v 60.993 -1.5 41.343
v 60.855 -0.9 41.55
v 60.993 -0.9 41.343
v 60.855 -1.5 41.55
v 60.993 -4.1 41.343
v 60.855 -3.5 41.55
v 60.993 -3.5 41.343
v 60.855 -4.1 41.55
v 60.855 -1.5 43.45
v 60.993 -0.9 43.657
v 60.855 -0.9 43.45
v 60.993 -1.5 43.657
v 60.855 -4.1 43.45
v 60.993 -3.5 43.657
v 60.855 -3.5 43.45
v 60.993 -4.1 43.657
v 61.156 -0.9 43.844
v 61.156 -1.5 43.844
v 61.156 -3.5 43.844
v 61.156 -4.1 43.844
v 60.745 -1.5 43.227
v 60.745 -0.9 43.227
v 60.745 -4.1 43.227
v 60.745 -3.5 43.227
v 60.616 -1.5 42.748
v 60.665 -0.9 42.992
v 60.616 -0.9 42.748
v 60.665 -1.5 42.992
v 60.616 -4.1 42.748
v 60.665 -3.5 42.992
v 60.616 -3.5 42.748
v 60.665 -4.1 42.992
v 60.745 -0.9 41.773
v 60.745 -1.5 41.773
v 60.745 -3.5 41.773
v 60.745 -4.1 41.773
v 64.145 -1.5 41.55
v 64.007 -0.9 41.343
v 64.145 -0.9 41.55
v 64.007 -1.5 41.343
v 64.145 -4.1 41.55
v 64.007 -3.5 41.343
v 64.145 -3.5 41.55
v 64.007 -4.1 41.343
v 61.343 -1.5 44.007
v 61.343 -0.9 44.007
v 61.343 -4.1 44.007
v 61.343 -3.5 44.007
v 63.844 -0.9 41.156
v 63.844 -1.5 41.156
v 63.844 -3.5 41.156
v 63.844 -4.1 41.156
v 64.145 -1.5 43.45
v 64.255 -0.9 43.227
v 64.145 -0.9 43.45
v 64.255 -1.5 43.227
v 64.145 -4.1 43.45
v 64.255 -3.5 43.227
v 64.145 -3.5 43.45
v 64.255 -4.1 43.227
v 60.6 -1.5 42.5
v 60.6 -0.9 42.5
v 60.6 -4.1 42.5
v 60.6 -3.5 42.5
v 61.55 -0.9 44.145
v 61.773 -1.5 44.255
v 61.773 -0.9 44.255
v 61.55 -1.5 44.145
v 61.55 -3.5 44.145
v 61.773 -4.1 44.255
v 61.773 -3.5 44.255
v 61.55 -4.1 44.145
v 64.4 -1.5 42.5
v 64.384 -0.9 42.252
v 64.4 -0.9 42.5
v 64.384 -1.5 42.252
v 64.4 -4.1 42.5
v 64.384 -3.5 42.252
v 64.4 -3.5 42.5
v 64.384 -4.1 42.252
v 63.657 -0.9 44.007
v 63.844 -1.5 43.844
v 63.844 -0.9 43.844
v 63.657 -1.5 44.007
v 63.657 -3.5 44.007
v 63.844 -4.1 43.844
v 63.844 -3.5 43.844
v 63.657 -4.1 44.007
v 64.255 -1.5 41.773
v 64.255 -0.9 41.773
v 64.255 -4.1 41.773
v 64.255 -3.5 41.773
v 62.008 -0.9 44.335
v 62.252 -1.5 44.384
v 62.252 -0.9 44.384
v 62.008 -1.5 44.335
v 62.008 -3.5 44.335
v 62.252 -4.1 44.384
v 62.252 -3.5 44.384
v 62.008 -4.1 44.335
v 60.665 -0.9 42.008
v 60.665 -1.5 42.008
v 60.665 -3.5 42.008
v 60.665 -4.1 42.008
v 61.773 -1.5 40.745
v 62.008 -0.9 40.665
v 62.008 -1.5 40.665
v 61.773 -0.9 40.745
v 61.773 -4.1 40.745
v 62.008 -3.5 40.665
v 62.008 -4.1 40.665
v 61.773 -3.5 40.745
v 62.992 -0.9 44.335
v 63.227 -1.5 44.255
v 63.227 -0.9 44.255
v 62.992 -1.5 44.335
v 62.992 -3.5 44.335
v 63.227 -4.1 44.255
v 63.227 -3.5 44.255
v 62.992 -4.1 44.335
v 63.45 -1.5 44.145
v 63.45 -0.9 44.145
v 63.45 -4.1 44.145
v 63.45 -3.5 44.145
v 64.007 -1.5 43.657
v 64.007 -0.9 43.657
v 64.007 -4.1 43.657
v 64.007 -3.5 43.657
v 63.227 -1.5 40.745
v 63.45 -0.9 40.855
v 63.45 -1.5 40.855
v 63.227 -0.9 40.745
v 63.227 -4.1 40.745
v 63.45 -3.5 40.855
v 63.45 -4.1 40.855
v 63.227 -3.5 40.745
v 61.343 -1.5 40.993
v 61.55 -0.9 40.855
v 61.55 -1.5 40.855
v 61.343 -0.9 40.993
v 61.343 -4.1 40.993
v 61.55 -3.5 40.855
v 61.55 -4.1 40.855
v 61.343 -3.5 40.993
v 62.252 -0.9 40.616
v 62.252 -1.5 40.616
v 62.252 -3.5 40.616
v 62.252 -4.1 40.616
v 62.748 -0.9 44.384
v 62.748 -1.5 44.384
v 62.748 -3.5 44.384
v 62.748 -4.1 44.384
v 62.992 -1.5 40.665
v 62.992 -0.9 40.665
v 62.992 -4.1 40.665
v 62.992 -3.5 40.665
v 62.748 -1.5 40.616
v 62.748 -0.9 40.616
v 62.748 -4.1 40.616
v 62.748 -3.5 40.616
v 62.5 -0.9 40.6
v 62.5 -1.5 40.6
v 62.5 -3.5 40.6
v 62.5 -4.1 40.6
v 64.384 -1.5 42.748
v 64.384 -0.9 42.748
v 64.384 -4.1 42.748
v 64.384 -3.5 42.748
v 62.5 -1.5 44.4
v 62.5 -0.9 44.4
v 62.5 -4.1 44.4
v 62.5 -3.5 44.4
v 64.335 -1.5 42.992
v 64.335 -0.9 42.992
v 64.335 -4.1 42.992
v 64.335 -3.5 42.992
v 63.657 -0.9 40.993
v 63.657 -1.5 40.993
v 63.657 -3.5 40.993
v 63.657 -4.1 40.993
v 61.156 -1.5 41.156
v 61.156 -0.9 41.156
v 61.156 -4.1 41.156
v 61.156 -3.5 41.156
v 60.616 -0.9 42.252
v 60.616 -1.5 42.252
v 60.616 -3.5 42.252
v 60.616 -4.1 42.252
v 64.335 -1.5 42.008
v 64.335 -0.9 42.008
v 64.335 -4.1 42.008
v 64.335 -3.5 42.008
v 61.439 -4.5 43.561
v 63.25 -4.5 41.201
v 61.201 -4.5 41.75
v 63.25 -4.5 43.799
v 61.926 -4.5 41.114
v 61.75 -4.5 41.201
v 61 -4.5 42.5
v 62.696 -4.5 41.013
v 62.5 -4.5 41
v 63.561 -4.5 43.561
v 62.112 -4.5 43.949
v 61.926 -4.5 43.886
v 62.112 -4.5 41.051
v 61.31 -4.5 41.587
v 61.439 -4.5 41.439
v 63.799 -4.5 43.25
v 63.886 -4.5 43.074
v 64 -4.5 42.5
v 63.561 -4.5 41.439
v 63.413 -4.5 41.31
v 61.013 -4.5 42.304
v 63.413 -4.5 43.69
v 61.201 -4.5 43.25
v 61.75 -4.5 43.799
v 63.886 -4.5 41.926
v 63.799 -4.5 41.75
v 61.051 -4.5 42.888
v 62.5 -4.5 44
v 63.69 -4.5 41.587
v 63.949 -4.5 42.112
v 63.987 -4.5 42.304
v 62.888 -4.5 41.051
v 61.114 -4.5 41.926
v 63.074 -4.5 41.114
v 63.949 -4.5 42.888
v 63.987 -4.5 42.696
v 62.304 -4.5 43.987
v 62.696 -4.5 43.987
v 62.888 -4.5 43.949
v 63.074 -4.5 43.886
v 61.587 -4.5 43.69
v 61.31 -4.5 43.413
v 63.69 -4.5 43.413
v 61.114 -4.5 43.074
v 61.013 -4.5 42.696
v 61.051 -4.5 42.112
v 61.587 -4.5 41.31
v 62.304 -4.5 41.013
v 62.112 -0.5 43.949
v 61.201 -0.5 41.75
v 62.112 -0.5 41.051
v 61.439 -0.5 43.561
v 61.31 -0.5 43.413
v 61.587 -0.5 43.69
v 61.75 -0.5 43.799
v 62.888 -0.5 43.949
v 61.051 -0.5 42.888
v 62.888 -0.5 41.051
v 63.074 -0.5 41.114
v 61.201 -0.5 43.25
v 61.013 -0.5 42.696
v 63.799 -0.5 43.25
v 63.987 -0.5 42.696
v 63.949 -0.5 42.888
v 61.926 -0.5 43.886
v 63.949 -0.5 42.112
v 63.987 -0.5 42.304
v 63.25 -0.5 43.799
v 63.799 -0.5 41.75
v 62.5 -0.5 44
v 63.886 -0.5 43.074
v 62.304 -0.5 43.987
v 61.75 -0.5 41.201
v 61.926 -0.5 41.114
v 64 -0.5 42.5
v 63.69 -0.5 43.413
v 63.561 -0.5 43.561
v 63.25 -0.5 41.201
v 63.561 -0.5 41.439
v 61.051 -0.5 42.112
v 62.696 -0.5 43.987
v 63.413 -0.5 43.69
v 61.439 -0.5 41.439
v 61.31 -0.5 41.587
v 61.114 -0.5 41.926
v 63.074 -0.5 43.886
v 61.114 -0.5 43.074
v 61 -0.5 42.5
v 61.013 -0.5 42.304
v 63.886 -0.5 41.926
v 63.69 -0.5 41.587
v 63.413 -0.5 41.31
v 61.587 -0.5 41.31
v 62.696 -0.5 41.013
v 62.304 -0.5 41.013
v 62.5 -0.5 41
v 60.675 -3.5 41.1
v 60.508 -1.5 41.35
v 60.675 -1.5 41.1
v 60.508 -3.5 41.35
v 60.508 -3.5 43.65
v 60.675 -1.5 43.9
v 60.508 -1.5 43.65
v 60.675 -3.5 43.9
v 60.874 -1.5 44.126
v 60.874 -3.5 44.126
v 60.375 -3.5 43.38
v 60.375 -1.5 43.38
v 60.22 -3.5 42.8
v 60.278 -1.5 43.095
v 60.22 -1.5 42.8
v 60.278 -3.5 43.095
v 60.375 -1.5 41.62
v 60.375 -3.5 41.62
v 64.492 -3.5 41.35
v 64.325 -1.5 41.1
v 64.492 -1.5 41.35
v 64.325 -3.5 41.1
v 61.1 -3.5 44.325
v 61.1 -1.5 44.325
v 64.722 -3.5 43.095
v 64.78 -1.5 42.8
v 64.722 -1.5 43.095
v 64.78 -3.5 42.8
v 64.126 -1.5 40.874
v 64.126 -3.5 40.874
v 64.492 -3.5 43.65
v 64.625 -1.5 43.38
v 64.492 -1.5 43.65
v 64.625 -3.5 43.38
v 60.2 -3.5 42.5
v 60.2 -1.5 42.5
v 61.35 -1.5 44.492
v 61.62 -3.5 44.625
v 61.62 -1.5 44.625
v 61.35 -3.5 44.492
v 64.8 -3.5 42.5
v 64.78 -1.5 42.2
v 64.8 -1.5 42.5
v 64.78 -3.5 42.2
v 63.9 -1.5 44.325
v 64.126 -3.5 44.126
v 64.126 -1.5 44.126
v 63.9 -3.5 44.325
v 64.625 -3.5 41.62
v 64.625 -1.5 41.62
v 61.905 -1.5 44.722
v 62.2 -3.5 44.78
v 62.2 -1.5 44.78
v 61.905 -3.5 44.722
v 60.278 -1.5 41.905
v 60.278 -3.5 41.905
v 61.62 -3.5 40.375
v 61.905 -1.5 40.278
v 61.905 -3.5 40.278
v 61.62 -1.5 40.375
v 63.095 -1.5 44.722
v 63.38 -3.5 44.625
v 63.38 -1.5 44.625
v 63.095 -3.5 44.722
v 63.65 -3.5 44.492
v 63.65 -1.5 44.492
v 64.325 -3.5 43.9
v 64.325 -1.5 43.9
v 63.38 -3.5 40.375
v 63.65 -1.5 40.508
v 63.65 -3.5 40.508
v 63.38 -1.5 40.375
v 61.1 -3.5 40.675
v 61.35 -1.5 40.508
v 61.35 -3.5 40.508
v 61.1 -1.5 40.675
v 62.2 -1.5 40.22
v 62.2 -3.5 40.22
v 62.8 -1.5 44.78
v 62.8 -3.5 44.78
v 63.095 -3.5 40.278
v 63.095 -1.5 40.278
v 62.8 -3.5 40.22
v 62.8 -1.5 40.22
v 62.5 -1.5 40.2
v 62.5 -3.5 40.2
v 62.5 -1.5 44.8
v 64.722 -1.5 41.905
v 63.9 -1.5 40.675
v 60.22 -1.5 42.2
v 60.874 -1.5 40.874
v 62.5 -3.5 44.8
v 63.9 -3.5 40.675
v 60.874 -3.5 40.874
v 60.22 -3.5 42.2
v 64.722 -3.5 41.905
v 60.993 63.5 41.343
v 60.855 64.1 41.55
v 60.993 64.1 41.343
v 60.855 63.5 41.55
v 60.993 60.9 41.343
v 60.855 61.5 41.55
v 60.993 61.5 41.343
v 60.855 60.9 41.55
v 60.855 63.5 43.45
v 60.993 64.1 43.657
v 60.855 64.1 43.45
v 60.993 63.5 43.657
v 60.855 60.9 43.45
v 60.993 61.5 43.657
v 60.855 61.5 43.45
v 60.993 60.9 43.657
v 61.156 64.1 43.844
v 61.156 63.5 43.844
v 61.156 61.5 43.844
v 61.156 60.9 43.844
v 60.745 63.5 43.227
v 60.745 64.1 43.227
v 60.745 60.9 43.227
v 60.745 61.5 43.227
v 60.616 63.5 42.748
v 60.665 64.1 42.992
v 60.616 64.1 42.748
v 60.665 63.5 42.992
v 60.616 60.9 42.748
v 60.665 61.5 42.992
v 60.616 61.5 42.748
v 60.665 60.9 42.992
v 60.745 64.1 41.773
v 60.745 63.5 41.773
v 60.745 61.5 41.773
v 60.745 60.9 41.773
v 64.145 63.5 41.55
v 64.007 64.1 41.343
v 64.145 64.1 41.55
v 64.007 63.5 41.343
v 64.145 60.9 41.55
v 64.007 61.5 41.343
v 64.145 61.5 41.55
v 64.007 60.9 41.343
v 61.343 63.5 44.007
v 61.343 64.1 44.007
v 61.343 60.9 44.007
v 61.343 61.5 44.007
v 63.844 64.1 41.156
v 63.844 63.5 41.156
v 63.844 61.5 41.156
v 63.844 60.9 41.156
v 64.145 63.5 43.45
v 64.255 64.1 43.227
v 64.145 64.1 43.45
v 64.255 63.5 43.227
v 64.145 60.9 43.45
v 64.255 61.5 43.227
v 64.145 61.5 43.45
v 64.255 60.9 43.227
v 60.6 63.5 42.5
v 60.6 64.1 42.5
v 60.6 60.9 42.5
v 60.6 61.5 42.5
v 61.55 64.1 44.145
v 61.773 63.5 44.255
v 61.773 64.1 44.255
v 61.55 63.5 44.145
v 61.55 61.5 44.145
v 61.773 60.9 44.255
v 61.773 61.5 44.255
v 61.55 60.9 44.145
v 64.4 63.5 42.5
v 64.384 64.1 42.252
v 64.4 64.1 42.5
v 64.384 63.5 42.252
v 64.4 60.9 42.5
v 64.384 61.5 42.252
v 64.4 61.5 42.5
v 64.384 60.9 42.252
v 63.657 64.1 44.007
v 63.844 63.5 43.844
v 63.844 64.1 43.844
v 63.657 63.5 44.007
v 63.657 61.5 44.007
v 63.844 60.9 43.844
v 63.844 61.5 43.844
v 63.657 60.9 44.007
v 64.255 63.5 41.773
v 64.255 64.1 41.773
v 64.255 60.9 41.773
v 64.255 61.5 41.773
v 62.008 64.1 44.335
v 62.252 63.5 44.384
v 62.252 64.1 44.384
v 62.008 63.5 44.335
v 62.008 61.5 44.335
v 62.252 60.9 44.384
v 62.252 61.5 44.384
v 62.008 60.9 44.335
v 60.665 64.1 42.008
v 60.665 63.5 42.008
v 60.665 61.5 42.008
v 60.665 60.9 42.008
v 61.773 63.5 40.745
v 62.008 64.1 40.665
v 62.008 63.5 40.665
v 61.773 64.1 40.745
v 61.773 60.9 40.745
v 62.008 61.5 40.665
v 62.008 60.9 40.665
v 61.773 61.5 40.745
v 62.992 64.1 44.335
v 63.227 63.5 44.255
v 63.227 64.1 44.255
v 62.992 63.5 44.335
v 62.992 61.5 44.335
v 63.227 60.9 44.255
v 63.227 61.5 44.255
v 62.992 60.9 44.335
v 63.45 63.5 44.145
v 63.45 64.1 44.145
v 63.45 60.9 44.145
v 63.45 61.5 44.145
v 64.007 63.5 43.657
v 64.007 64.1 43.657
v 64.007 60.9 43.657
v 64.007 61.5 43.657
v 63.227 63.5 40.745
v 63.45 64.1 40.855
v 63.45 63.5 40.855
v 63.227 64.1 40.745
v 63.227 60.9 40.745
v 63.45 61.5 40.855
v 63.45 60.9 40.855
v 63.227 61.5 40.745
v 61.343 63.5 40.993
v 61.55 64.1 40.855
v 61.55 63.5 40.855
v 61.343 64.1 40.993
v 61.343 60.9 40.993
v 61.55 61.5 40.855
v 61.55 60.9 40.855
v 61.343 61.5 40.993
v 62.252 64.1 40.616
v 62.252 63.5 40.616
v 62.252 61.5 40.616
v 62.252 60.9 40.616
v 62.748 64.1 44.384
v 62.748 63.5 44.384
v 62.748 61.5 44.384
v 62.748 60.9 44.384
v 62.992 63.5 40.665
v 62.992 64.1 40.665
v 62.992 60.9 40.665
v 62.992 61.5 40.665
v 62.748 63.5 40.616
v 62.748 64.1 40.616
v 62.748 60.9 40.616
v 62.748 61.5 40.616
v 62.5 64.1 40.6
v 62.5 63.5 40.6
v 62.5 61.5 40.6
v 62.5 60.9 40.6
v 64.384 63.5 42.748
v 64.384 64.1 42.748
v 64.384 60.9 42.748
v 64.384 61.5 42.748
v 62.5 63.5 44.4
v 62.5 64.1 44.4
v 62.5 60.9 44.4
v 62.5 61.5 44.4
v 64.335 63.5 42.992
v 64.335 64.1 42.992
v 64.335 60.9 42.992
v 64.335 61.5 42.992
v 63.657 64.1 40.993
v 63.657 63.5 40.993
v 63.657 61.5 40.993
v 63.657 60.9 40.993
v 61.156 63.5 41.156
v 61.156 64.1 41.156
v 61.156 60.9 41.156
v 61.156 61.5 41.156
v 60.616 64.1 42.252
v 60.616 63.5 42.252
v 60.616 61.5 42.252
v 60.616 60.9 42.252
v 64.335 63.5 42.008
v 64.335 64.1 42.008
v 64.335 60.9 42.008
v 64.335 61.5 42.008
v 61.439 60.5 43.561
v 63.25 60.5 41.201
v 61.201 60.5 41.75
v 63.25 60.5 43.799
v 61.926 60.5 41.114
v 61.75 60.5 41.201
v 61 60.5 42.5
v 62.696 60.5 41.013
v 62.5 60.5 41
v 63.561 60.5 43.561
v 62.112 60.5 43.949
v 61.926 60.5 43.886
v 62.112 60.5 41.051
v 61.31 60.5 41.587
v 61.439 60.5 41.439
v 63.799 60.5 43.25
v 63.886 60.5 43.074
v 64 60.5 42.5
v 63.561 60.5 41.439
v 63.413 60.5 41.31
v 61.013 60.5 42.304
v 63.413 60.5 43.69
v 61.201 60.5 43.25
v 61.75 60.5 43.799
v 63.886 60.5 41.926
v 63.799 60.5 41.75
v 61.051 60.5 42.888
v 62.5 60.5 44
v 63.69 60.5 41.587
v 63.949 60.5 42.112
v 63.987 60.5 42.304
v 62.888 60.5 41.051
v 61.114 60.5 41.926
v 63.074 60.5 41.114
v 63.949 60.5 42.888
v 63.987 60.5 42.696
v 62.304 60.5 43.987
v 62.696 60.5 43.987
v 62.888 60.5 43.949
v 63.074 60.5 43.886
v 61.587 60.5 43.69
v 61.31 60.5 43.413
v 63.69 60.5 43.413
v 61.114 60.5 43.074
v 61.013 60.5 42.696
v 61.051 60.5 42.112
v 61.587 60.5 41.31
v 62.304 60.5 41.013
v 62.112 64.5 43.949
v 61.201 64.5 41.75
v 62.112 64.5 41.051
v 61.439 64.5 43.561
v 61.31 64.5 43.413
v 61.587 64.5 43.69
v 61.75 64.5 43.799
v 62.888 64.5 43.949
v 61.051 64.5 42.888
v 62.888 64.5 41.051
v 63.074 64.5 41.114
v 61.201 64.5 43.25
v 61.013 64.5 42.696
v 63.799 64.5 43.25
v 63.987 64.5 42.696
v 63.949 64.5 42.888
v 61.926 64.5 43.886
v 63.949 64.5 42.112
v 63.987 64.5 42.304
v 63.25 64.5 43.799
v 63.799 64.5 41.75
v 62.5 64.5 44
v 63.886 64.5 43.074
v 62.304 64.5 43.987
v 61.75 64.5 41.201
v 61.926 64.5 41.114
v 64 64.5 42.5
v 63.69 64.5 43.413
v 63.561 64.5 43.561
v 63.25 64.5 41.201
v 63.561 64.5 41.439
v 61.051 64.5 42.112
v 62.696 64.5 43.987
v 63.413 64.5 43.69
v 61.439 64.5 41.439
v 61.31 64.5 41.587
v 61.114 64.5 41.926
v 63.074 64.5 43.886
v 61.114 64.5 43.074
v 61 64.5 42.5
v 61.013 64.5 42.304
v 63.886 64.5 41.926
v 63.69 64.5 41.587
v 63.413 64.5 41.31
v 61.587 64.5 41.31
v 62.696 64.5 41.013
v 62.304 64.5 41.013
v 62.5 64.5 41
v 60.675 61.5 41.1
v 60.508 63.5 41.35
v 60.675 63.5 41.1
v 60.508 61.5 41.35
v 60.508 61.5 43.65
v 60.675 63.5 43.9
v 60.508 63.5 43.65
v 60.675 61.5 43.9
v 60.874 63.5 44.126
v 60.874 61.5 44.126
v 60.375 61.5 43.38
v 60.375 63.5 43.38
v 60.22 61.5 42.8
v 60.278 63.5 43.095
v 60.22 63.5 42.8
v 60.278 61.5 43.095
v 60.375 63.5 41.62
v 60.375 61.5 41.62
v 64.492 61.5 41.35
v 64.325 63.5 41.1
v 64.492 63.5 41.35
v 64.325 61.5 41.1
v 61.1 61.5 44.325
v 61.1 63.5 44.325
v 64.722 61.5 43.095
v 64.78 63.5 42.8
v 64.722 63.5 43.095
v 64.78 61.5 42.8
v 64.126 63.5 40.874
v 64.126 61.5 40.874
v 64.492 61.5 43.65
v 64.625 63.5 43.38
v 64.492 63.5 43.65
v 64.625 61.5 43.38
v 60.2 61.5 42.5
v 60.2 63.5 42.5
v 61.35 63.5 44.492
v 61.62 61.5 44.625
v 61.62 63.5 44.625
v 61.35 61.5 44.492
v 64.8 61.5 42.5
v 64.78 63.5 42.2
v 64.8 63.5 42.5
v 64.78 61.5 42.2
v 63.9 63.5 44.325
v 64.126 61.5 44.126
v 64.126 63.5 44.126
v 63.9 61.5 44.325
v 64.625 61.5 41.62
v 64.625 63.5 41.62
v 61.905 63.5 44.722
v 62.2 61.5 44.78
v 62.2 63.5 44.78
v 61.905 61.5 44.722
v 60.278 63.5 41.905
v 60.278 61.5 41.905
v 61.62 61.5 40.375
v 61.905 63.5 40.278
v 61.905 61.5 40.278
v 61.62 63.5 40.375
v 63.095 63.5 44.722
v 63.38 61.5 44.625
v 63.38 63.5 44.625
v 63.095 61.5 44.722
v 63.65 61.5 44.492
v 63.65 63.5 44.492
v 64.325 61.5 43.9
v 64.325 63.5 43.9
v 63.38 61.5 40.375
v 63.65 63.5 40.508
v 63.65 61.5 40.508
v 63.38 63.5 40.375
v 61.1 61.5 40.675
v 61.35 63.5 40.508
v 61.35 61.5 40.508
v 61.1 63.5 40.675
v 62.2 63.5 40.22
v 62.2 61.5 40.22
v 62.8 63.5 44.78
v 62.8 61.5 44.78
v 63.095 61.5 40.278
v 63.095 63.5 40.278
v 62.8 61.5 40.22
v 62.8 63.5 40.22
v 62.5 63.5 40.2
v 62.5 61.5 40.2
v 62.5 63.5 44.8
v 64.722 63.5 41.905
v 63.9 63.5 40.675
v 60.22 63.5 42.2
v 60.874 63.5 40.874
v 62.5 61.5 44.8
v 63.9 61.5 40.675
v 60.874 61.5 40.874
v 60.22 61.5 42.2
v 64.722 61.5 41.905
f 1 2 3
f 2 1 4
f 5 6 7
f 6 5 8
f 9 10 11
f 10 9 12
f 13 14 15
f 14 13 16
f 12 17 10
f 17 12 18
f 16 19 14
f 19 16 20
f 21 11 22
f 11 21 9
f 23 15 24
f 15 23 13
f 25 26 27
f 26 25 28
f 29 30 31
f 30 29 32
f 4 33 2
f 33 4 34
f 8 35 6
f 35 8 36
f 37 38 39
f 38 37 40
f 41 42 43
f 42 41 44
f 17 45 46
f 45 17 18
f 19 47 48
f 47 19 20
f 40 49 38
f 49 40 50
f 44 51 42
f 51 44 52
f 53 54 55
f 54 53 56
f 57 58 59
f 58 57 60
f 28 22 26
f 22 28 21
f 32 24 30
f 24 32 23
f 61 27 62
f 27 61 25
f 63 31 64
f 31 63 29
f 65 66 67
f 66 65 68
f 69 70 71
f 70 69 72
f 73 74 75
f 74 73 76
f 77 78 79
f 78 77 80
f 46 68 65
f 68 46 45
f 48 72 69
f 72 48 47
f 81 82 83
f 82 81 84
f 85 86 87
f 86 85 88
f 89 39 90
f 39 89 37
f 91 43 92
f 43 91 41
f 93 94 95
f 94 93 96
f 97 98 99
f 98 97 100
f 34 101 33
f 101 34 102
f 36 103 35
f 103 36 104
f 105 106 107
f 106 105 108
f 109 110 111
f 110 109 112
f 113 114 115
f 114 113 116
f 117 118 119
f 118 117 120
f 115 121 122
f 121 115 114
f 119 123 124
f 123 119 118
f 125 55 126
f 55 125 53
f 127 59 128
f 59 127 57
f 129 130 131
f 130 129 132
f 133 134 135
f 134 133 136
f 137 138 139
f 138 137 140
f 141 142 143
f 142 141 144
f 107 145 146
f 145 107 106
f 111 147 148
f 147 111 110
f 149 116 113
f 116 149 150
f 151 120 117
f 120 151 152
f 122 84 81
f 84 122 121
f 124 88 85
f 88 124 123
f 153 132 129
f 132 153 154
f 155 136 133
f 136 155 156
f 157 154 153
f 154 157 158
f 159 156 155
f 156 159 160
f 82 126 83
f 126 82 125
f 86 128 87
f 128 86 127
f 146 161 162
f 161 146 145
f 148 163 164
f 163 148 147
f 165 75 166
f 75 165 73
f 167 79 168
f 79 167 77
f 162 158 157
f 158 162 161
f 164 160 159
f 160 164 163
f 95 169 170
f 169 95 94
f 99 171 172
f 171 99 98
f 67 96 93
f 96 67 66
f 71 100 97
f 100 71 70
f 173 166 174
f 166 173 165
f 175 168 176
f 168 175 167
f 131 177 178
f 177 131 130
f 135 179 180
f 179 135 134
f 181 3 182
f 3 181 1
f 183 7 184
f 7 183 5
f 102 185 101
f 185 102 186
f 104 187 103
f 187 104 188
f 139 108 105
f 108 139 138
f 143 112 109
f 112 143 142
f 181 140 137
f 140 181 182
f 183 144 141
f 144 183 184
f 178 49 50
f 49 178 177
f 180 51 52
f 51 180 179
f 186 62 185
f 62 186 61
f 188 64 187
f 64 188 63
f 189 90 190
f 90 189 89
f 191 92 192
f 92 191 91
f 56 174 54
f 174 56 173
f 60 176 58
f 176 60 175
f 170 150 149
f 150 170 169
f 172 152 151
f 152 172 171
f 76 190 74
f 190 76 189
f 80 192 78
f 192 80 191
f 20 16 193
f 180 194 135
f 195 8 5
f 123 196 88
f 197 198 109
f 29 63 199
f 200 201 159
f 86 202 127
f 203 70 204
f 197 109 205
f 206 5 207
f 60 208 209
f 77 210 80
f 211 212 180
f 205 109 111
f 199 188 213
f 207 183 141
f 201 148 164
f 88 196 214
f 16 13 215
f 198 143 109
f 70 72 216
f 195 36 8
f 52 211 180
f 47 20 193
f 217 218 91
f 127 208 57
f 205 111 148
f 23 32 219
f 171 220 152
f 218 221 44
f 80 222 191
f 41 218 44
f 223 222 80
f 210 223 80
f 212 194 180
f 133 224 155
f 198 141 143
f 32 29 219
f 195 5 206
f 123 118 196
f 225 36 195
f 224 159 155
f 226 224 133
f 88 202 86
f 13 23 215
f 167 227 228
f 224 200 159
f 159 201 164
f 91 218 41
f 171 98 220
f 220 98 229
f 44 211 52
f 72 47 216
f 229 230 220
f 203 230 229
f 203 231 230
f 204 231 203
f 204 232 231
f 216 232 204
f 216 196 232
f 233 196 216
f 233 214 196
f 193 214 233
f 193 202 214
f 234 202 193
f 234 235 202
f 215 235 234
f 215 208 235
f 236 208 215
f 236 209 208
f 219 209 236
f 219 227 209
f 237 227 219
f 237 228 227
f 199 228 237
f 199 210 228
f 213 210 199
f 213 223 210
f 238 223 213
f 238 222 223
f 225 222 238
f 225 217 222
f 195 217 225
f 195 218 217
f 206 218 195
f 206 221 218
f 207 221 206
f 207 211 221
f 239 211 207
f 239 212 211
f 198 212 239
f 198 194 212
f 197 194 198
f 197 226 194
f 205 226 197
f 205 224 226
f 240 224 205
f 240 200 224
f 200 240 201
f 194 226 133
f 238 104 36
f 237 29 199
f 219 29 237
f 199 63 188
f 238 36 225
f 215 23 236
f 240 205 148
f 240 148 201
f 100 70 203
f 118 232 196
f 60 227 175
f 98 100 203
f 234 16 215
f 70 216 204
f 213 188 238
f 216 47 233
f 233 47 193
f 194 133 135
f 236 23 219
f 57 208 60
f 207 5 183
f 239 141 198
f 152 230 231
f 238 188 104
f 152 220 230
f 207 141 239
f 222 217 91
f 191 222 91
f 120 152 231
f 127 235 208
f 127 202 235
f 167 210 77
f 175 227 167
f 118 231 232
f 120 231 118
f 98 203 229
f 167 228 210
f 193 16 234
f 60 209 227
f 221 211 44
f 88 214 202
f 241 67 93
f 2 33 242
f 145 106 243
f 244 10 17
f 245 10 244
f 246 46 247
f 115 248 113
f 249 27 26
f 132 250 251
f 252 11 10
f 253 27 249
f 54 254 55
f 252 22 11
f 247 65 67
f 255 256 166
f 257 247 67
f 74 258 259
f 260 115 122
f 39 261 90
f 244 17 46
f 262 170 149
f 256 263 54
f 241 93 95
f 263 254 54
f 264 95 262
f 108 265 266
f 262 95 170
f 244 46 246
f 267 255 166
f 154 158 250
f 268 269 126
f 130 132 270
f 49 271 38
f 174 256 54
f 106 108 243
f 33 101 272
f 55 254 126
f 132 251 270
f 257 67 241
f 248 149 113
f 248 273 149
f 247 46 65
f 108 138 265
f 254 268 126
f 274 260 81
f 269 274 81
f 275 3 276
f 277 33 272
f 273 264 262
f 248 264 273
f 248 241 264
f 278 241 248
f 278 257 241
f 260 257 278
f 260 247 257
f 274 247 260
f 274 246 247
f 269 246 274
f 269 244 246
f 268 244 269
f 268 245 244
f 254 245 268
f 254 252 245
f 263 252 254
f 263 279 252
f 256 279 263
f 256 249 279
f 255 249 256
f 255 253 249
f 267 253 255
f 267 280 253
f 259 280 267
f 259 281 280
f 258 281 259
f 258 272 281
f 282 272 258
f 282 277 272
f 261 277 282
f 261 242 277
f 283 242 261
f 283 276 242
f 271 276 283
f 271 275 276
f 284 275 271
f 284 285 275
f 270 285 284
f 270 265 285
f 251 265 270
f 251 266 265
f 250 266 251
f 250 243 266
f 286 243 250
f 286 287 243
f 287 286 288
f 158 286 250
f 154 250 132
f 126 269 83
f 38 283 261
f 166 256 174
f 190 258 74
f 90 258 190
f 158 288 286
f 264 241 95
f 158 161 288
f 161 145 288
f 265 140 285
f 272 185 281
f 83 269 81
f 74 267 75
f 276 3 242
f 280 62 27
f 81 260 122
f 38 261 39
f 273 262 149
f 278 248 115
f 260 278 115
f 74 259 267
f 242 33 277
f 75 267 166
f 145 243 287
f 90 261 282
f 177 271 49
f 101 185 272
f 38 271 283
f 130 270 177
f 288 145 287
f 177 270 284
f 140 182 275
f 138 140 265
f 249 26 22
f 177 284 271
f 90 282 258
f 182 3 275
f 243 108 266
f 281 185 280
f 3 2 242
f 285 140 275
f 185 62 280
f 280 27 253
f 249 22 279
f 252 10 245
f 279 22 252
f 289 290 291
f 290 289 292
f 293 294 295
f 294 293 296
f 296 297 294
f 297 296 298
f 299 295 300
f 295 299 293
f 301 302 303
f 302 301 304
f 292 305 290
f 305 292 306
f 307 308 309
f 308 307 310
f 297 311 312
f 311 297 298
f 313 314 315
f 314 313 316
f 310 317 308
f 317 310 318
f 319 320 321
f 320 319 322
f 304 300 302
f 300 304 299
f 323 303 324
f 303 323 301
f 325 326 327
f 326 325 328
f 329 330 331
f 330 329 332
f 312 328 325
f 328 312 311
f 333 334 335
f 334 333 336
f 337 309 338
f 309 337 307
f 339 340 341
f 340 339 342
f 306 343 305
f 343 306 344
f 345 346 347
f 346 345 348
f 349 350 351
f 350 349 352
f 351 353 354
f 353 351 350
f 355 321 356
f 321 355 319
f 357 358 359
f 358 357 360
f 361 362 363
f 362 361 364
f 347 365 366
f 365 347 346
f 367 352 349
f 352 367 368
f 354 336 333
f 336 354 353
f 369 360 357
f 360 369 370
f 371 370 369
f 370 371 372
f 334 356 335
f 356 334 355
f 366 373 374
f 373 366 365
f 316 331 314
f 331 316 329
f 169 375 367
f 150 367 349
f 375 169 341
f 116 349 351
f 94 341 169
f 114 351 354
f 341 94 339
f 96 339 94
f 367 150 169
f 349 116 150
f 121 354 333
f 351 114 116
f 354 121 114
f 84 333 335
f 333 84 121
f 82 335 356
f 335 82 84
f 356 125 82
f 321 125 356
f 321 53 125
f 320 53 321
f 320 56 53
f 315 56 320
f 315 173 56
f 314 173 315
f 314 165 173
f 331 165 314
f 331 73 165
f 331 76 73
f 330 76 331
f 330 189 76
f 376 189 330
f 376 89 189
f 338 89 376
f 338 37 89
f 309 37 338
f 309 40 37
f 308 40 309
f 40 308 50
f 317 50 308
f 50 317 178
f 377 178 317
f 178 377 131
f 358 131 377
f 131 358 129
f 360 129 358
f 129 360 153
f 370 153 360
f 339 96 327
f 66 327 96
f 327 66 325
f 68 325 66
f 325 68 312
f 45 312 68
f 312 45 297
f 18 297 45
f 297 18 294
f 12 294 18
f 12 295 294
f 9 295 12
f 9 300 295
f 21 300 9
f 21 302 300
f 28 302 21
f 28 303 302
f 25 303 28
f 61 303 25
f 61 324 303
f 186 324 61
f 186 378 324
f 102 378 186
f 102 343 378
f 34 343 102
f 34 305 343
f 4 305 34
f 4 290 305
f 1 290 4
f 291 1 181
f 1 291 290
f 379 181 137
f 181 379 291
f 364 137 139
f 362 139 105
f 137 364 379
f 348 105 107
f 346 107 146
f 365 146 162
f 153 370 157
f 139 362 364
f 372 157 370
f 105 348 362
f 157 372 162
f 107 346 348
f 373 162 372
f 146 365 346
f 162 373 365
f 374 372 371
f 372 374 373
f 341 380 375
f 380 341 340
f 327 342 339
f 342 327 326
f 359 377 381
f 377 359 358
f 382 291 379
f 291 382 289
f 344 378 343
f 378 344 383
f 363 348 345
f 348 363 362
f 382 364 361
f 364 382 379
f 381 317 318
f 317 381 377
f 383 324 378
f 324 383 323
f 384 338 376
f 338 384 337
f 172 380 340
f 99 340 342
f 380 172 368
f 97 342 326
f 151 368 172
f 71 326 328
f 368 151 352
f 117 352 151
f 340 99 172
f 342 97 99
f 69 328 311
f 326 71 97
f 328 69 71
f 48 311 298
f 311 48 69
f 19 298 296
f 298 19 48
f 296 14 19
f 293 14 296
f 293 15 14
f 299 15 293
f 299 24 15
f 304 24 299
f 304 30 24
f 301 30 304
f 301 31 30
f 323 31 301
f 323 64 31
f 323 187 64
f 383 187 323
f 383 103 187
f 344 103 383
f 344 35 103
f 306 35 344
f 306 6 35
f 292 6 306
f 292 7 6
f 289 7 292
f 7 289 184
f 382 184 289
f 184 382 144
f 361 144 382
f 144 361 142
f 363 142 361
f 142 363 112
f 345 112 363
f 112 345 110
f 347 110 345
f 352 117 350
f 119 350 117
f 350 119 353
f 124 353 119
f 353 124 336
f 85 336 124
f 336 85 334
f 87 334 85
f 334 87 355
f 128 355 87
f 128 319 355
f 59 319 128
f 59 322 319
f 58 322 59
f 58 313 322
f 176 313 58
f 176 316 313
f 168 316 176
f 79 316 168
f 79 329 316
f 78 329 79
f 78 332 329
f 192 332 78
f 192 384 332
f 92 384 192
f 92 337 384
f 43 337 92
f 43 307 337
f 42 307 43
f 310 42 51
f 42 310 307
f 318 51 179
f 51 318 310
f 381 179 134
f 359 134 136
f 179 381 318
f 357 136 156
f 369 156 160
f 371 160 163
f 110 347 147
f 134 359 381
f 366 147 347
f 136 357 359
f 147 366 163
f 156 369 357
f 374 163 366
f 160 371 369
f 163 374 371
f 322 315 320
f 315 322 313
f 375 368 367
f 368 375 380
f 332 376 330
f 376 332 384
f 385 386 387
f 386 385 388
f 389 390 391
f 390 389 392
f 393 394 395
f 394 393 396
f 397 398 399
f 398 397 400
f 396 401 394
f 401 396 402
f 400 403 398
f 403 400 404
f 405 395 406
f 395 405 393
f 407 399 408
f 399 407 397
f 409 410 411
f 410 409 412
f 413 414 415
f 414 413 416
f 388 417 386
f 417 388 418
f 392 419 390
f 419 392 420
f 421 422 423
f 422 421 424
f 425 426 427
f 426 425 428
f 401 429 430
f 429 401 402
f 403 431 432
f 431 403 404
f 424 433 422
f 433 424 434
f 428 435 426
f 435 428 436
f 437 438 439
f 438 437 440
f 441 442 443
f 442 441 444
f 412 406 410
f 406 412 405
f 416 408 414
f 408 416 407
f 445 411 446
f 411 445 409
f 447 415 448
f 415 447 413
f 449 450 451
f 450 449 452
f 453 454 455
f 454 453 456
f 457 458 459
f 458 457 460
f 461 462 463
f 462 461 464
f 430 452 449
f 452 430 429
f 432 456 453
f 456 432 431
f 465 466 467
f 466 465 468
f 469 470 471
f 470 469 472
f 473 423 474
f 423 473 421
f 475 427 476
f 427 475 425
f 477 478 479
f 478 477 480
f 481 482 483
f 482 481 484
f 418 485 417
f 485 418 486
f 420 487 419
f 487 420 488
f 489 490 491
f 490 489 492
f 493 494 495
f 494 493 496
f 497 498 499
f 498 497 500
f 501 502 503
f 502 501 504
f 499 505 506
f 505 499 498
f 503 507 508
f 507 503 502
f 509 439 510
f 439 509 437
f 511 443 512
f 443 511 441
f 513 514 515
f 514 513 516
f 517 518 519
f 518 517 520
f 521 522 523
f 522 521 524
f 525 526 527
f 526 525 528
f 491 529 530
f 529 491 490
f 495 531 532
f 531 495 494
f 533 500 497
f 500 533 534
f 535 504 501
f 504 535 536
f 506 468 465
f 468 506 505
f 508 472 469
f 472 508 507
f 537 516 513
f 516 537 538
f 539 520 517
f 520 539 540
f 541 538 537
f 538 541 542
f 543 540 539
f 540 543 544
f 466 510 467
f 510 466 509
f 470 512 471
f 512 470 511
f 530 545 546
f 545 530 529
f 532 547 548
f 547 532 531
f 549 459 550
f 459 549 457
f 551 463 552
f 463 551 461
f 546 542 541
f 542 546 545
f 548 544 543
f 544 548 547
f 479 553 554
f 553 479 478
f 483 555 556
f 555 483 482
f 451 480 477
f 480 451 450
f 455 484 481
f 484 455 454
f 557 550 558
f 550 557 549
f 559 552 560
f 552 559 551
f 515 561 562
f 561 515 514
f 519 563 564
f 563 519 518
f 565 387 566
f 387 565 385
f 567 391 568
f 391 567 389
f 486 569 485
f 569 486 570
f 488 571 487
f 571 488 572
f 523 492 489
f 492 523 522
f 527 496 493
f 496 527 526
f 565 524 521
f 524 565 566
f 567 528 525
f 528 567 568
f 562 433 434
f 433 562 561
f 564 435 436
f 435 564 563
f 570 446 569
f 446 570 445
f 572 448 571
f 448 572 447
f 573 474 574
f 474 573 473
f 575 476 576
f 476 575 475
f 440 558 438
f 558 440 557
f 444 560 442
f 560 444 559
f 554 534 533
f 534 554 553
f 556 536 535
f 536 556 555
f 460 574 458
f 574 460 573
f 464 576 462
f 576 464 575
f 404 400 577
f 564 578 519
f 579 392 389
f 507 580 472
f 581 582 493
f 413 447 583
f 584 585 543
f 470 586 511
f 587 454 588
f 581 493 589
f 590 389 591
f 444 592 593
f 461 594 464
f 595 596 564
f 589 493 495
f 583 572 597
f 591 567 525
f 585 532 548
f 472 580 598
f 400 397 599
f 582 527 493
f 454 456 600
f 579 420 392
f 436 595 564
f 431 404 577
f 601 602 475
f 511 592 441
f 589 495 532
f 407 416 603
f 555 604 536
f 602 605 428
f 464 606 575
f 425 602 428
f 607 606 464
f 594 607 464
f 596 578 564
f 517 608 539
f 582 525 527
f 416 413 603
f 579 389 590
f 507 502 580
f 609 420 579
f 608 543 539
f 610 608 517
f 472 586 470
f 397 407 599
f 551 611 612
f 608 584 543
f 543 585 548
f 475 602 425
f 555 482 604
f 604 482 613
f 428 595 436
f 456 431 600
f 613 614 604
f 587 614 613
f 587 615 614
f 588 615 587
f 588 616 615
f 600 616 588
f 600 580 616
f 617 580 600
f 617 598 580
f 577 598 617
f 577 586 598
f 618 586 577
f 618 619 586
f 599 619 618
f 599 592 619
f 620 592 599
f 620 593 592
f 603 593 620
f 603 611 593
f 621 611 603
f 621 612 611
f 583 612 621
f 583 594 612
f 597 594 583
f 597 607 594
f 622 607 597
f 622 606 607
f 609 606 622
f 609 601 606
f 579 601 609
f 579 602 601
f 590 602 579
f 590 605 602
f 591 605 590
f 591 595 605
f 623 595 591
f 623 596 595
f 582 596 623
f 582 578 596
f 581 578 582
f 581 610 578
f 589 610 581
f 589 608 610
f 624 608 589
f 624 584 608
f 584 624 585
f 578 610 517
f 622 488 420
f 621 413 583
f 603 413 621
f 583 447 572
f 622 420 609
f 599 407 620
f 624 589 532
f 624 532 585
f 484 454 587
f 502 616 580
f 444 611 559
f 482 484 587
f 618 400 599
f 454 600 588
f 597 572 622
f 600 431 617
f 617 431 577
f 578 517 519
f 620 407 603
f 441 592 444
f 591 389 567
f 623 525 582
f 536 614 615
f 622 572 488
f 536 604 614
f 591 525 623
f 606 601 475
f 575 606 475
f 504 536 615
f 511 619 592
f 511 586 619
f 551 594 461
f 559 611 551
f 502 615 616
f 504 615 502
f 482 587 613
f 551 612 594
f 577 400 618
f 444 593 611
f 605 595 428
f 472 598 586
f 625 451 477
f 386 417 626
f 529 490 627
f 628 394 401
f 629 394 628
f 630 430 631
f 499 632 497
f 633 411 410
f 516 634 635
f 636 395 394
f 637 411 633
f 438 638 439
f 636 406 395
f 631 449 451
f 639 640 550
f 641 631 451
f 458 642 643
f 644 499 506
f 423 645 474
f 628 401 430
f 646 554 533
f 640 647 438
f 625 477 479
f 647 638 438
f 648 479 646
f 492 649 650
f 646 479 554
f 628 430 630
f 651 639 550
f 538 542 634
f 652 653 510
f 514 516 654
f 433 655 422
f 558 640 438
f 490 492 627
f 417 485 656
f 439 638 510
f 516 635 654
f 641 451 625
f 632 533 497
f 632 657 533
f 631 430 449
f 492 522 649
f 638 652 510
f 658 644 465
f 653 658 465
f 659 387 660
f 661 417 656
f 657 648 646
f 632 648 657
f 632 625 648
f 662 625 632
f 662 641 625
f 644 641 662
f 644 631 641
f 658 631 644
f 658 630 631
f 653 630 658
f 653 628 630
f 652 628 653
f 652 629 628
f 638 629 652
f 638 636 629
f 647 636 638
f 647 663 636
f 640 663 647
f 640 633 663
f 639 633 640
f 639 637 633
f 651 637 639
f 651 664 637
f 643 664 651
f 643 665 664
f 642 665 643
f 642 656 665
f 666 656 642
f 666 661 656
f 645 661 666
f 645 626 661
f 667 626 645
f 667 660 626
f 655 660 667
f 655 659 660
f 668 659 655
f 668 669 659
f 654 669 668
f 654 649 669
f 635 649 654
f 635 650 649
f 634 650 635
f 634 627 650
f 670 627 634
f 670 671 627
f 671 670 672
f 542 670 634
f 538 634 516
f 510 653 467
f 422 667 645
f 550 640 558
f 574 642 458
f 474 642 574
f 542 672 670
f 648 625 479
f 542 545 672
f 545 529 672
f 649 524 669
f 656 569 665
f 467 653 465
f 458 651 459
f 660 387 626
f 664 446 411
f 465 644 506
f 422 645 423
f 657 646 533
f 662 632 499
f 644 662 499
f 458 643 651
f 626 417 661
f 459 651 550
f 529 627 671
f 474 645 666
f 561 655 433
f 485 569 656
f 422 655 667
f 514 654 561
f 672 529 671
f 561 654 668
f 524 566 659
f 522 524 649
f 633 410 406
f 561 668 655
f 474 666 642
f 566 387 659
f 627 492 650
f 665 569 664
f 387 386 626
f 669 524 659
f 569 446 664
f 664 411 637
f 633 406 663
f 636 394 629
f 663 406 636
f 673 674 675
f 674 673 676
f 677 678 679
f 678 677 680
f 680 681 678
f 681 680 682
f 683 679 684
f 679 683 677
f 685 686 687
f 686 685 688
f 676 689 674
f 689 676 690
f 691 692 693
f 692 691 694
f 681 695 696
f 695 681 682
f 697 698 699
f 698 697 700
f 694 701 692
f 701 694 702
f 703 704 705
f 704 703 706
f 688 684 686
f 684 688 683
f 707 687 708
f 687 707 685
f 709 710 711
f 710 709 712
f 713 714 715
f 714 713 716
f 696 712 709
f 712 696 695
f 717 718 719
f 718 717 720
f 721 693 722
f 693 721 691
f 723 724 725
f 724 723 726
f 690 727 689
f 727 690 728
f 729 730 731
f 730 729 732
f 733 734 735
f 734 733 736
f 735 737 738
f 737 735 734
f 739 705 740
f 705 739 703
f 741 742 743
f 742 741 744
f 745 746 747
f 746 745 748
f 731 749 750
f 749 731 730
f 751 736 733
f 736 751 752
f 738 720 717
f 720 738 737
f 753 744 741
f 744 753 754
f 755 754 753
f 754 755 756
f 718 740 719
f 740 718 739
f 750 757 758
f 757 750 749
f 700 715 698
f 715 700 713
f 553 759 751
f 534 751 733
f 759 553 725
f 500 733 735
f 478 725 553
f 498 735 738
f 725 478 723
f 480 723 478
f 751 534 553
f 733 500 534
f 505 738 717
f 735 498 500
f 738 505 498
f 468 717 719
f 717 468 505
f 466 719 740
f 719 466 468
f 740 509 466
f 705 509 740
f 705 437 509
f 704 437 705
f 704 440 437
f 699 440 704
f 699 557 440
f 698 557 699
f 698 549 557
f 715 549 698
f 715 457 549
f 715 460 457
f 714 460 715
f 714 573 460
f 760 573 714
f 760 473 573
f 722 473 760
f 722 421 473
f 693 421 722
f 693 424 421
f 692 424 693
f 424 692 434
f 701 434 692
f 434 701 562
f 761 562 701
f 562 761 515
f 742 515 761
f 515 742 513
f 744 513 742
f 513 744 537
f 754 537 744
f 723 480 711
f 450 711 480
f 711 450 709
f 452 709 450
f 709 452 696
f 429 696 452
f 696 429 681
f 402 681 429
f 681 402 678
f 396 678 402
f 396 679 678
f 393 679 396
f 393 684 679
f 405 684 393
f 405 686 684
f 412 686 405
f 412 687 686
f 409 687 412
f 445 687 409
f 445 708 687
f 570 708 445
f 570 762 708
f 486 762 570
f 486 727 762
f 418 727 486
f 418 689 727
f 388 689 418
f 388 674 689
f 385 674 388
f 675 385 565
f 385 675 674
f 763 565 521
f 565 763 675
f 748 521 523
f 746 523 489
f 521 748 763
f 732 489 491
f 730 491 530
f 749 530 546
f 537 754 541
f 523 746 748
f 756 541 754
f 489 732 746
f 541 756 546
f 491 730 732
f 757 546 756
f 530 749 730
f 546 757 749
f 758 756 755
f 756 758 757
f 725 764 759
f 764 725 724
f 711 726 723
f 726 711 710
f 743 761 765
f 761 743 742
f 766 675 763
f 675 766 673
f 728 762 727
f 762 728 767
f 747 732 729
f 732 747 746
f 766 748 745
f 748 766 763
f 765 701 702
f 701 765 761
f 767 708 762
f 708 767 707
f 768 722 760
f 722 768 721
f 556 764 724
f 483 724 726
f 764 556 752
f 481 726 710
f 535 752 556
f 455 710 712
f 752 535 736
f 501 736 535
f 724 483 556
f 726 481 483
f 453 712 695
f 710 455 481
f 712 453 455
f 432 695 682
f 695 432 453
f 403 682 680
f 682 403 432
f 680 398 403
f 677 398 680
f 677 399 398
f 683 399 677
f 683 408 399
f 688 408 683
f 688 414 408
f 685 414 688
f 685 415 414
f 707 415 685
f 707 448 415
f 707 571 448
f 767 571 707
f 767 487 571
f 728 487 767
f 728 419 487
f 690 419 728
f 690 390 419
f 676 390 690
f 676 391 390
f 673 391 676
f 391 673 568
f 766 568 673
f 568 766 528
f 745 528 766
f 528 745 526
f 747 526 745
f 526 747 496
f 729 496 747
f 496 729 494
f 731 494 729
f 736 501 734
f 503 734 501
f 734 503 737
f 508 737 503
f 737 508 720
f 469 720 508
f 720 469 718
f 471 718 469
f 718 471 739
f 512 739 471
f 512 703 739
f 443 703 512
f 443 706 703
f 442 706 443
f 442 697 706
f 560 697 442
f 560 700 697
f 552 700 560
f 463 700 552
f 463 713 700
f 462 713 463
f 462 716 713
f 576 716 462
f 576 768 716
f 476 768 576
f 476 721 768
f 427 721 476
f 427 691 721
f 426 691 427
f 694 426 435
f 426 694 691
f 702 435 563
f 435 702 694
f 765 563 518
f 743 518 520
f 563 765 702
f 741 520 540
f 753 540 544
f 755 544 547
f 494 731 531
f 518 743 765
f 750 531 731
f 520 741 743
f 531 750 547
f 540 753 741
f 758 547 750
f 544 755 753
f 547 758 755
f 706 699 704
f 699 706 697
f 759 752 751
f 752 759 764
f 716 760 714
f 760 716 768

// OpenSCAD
// file: ../../impl/openscad/params.scad
// ============================================================
// PARAMS — primitivos e derivados do sistema
// ============================================================
// FONTE ÚNICA dos primitivos no OpenSCAD. Toda peça faz
// `include <params.scad>` em vez de redeclarar.
//
// Antes disto os 7 primitivos estavam copiados em brick, pin,
// node e dock — 28 declarações para 7 valores. Foi o que deixou
// `pin_len` ficar 1.6 na spec e 2.0 em quatro implementações sem
// ninguém notar. O `make spec-check` DETECTA essa divergência;
// este arquivo IMPEDE que ela exista.
//
// Reatribuir daqui funciona por include aninhado — testado:
// variante -> peça -> params propaga e os derivados recomputam.
//
// ⚠️ Variável NOVA da variante tem de ser declarada ANTES do
// `include`. Depois dele o OpenSCAD avalia a reatribuição no
// ponto da declaração original, onde a variável nova ainda não
// existe: sai `WARNING: Ignoring unknown variable` e o valor
// errado, em silêncio.
//
// contrato: spec/parts/brick/contracts.toml
// premissas: spec/constitution.md
// ============================================================

/* [Primitivos do sistema] */

// Diâmetro do furo passante — a interface mecânica
hole_d = 4.0; // [1:0.1:30]

// Parede interna mínima (4 perímetros de 0.4)
wall = 1.6; // [0.4:0.1:6]

// Degrau RADIAL entre furo e rebaixo (1 bico de 0.4)
collar_w = 0.4; // [0:0.1:2]

// Profundidade AXIAL do rebaixo
collar_depth = 1.0; // [0.25:0.25:4]

// Folga de press-fit, subtraída sempre do MACHO
tolerance = 0.2; // [0:0.05:0.6]

// Folga real mínima entre dois machos que se aproximam
gap = 0.5; // [0:0.1:2]

// Protrusão do macho. DECLARADO, não derivado: o limite é a
// colisão com o macho PERPENDICULAR, e essa aproximação é
// DIAGONAL, não axial. Ver constitution.md § 5.
pin_len = 2.0; // [0.5:0.05:6]

/* [Qualidade] */
$fn = 48;

// ============================================================
// DERIVADOS — nada aqui é escolhido à mão
// ============================================================
grid     = hole_d + 2 * (wall + collar_w);
recess_d = hole_d + 2 * collar_w;
pin_d    = hole_d - tolerance;
collar_d = recess_d - tolerance;
inset    = grid / 2;

// Teto do macho: duas hastes perpendiculares se tocam aqui.
pin_len_max = grid / 2 - pin_d / 2;

// Furo de BORDA exige seção — é o que fixa o grid.
edge_bore_min = hole_d + 2 * wall;

// Chanfro de entrada do macho. Constante, não parâmetro: existe
// para o macho achar o furo, e ninguém decide isso peça a peça.
lead_in = 0.4;

assert(pin_len <= pin_len_max,
       str("macho longo demais: ", pin_len, " > ", pin_len_max,
           " — encosta no macho perpendicular da célula receptora"));
assert(pin_len > collar_depth,
       "colar mais fundo que a protrusão: a haste não sai do colar");
assert(hole_d * sqrt(2) > recess_d,
       "rebaixo morde a barra da aresta: exige hole_d·√2 > recess_d");

// ============================================================
// O CONECTOR — desenhado UMA vez, usado por toda peça
// ============================================================
// Referencial: origem no centro da face, +Z para FORA da peça.

// Vocabulário dos encaixes. A IR de montagem diz stud / socket / flat
// (spec/assembly.md § Nomes); os parâmetros das peças sempre disseram
// pin / recess / plain. As duas formas valem em qualquer -D.
function fb_kind(k) = k == "stud" ? "pin" : k == "socket" ? "recess" : k == "flat" ? "plain" : k;

// MACHO: colar (quem retém) + haste + chanfro de entrada.
// `sink` afunda a base no corpo, só para a união não ficar coplanar.
module fb_male(sink = 0) {
    translate([0, 0, -sink]) cylinder(d = collar_d, h = collar_depth + sink);
    cylinder(d = pin_d, h = pin_len - lead_in);
    translate([0, 0, pin_len - lead_in])
        cylinder(r1 = pin_d / 2, r2 = pin_d / 2 - lead_in, h = lead_in);
}

// FÊMEA (para subtrair): rebaixo que aloja o colar e, com `bore > 0`,
// o furo de profundidade `bore` atrás dele.
module fb_female(bore = 0, recess = true) {
    e = 0.02;
    if (recess) translate([0, 0, -collar_depth]) cylinder(d = recess_d, h = collar_depth + e);
    if (bore > 0) translate([0, 0, -bore]) cylinder(d = hole_d, h = bore + e);
}
// file: ../../impl/openscad/pin.scad
// ============================================================
// PIN — Design System 3D Modular
// ============================================================
// O único macho solto do sistema. Une dois furos, em qualquer
// escala. Absorve BRIDGE (cavilha), LINK (conector de face) e
// LINK-ONESIDE — os três eram o mesmo objeto em tamanhos
// diferentes.
//
// NOTA DE NOMENCLATURA: até a v1, PIN era o nome da viga. A
// viga virou BRICK 1×1×n, e o nome passou para o macho — que
// é o que ele descreve.
//
//        ┌──┐        ← Ø pino
//     ┌──┴──┴──┐     ← Ø colar (assenta no rebaixo)
//     └──┬──┬──┘
//        └──┘
//
// QUEM RETÉM É O COLAR. A haste além dele ALINHA, não segura —
// alongar `pin_len` melhora torção e balanço, e não muda a
// força de arrancamento. Essa é `collar_depth` / `tolerance`.
//
// spec: spec/parts/pin.md
// ============================================================

// Primitivos e derivados: fonte única, não redeclarar aqui.
include <params.scad>

/* [Escala] */
// Diâmetro do furo RECEPTOR. Um PIN para o furo padrão e um
// para o recurso central são a mesma peça, com `size` diferente.
size = 4.0; // [2:0.5:60]

/* [Forma] */
// 1 = macho de uma ponta · 2 = cavilha, metade em cada furo
ends = 2; // [1:1:2]

// Afastamento entre as duas pontas. É onde o macho fica mais
// longo sem alterar quanto cada ponta entra.
spacer = 0; // [0:0.5:60]

// Chanfro de entrada

// Cópias lado a lado — peça pequena solta imprime mal
qty     = 1; // [1:1:20]
qty_gap = 4; // [2:0.5:20]

// ============================================================
// DERIVADOS
// ============================================================

// Protrusão do macho. DECLARADO, não derivado.
//
// A versão anterior fazia `wall + collar_w + tolerance/2 - gap`,
// que cobrava √2 a mais do que a geometria pede: o limite é a
// colisão com o macho PERPENDICULAR da célula receptora, e essa
// aproximação é DIAGONAL, não axial. Subtrair `gap` do eixo
// gastava 0.5mm de engate para comprar 0.71mm de folga.
//
// O teto verdadeiro está no assert abaixo. 2.0 foi verificado
// por dilatação (minkowski): folga real ≥ 0.5mm.

// Teto geométrico: a haste tem raio pin_d/2 e parte da face, a
// grid/2 do centro. Duas hastes perpendiculares se tocam quando
// pin_len alcança essa diferença.

// Vazado quando o diâmetro permite. Na escala micro sobram
// 0.6mm — abaixo do jumper Dupont, então o macho é maciço.
canal_raw = pin_d - 2 * wall;
canal_d   = canal_raw >= 2.5 ? canal_raw : 0;

total_len = ends == 2 ? 2 * pin_len + spacer : pin_len;
collar_h  = ends == 2 ? 2 * collar_depth + spacer : collar_depth;

// ============================================================
// VALIDAÇÃO
// ============================================================
assert(ends != 2 || 2 * pin_len <= grid - gap,
       "duas pontas não cabem num furo passante compartilhado");
// ============================================================
// MÓDULOS
// ============================================================
// Haste centrada na origem, chanfrada nas DUAS pontas. O
// chanfro corta para DENTRO do comprimento — não estende.
module shaft_chamfered(len) {
    r = pin_d / 2;
    h = len / 2;
    if (lead_in <= 0) cylinder(d = pin_d, h = len, center = true);
    else union() {
        cylinder(d = pin_d, h = len - 2 * lead_in, center = true);
        translate([0, 0,  h - lead_in]) cylinder(r1 = r, r2 = r - lead_in, h = lead_in);
        translate([0, 0, -h])           cylinder(r1 = r - lead_in, r2 = r, h = lead_in);
    }
}

module pin_solid() {
    if (ends == 2) {
        // Cavilha: haste passante + colar central, dividido
        // entre os rebaixos dos dois furos
        union() {
            shaft_chamfered(total_len);
            translate([0, 0, -collar_h/2]) cylinder(d = collar_d, h = collar_h);
        }
    } else {
        fb_male();
    }
}

// Módulo público da peça — mesmo padrão de brick()/node()/dock(),
// que é o nome que um assembly importa com `use <pin.scad>`.
module pin() {
    if (canal_d <= 0) pin_solid();
    else difference() {
        pin_solid();
        translate([0, 0, -total_len])
            cylinder(d = canal_d, h = 3 * total_len);
    }
}

// ============================================================
// RENDER
// ============================================================
part_color = [0.85, 0.55, 0.20];
color(part_color)
    for (i = [0 : qty - 1])
        translate([i * (collar_d + qty_gap), 0, 0]) pin();

// ============================================================
// INFO
// ============================================================
echo("=== PIN ===");
echo(str("Escala      furo receptor Ø", size, " | grid do sistema ", grid));
echo(str("PINO        haste Ø", pin_d, " | colar Ø", collar_d, "×", collar_h, " | protrusão ", pin_len, " por ponta"));
echo(str("Forma       ", ends, " ponta(s) | spacer ", spacer, " | total ", total_len, "mm (×", qty, ")"));
echo("---");
echo(str("Haste além do colar : ", pin_len - collar_depth, "mm  — quem retém é o COLAR"));
echo(str("Aperto no colar     : ", recess_d - collar_d, "mm no diâmetro"));
echo(str("Canal de fio        : ", canal_d > 0 ? str("Ø", canal_d, "mm") : str("fechado (só ", canal_raw, "mm, mínimo 2.5)")));
// main file
use <../../impl/openscad/pin.scad>
dl = 40 * sqrt(2);
echo(str("len = ", dl));
for (py = [-2.5, 62.5])
    translate([62.5, py, 42.5]) rotate([0,225,0]) rotate([90,0,0])
        pin(top="none", bottom="none", sides="none", ends="pin", len=dl);
